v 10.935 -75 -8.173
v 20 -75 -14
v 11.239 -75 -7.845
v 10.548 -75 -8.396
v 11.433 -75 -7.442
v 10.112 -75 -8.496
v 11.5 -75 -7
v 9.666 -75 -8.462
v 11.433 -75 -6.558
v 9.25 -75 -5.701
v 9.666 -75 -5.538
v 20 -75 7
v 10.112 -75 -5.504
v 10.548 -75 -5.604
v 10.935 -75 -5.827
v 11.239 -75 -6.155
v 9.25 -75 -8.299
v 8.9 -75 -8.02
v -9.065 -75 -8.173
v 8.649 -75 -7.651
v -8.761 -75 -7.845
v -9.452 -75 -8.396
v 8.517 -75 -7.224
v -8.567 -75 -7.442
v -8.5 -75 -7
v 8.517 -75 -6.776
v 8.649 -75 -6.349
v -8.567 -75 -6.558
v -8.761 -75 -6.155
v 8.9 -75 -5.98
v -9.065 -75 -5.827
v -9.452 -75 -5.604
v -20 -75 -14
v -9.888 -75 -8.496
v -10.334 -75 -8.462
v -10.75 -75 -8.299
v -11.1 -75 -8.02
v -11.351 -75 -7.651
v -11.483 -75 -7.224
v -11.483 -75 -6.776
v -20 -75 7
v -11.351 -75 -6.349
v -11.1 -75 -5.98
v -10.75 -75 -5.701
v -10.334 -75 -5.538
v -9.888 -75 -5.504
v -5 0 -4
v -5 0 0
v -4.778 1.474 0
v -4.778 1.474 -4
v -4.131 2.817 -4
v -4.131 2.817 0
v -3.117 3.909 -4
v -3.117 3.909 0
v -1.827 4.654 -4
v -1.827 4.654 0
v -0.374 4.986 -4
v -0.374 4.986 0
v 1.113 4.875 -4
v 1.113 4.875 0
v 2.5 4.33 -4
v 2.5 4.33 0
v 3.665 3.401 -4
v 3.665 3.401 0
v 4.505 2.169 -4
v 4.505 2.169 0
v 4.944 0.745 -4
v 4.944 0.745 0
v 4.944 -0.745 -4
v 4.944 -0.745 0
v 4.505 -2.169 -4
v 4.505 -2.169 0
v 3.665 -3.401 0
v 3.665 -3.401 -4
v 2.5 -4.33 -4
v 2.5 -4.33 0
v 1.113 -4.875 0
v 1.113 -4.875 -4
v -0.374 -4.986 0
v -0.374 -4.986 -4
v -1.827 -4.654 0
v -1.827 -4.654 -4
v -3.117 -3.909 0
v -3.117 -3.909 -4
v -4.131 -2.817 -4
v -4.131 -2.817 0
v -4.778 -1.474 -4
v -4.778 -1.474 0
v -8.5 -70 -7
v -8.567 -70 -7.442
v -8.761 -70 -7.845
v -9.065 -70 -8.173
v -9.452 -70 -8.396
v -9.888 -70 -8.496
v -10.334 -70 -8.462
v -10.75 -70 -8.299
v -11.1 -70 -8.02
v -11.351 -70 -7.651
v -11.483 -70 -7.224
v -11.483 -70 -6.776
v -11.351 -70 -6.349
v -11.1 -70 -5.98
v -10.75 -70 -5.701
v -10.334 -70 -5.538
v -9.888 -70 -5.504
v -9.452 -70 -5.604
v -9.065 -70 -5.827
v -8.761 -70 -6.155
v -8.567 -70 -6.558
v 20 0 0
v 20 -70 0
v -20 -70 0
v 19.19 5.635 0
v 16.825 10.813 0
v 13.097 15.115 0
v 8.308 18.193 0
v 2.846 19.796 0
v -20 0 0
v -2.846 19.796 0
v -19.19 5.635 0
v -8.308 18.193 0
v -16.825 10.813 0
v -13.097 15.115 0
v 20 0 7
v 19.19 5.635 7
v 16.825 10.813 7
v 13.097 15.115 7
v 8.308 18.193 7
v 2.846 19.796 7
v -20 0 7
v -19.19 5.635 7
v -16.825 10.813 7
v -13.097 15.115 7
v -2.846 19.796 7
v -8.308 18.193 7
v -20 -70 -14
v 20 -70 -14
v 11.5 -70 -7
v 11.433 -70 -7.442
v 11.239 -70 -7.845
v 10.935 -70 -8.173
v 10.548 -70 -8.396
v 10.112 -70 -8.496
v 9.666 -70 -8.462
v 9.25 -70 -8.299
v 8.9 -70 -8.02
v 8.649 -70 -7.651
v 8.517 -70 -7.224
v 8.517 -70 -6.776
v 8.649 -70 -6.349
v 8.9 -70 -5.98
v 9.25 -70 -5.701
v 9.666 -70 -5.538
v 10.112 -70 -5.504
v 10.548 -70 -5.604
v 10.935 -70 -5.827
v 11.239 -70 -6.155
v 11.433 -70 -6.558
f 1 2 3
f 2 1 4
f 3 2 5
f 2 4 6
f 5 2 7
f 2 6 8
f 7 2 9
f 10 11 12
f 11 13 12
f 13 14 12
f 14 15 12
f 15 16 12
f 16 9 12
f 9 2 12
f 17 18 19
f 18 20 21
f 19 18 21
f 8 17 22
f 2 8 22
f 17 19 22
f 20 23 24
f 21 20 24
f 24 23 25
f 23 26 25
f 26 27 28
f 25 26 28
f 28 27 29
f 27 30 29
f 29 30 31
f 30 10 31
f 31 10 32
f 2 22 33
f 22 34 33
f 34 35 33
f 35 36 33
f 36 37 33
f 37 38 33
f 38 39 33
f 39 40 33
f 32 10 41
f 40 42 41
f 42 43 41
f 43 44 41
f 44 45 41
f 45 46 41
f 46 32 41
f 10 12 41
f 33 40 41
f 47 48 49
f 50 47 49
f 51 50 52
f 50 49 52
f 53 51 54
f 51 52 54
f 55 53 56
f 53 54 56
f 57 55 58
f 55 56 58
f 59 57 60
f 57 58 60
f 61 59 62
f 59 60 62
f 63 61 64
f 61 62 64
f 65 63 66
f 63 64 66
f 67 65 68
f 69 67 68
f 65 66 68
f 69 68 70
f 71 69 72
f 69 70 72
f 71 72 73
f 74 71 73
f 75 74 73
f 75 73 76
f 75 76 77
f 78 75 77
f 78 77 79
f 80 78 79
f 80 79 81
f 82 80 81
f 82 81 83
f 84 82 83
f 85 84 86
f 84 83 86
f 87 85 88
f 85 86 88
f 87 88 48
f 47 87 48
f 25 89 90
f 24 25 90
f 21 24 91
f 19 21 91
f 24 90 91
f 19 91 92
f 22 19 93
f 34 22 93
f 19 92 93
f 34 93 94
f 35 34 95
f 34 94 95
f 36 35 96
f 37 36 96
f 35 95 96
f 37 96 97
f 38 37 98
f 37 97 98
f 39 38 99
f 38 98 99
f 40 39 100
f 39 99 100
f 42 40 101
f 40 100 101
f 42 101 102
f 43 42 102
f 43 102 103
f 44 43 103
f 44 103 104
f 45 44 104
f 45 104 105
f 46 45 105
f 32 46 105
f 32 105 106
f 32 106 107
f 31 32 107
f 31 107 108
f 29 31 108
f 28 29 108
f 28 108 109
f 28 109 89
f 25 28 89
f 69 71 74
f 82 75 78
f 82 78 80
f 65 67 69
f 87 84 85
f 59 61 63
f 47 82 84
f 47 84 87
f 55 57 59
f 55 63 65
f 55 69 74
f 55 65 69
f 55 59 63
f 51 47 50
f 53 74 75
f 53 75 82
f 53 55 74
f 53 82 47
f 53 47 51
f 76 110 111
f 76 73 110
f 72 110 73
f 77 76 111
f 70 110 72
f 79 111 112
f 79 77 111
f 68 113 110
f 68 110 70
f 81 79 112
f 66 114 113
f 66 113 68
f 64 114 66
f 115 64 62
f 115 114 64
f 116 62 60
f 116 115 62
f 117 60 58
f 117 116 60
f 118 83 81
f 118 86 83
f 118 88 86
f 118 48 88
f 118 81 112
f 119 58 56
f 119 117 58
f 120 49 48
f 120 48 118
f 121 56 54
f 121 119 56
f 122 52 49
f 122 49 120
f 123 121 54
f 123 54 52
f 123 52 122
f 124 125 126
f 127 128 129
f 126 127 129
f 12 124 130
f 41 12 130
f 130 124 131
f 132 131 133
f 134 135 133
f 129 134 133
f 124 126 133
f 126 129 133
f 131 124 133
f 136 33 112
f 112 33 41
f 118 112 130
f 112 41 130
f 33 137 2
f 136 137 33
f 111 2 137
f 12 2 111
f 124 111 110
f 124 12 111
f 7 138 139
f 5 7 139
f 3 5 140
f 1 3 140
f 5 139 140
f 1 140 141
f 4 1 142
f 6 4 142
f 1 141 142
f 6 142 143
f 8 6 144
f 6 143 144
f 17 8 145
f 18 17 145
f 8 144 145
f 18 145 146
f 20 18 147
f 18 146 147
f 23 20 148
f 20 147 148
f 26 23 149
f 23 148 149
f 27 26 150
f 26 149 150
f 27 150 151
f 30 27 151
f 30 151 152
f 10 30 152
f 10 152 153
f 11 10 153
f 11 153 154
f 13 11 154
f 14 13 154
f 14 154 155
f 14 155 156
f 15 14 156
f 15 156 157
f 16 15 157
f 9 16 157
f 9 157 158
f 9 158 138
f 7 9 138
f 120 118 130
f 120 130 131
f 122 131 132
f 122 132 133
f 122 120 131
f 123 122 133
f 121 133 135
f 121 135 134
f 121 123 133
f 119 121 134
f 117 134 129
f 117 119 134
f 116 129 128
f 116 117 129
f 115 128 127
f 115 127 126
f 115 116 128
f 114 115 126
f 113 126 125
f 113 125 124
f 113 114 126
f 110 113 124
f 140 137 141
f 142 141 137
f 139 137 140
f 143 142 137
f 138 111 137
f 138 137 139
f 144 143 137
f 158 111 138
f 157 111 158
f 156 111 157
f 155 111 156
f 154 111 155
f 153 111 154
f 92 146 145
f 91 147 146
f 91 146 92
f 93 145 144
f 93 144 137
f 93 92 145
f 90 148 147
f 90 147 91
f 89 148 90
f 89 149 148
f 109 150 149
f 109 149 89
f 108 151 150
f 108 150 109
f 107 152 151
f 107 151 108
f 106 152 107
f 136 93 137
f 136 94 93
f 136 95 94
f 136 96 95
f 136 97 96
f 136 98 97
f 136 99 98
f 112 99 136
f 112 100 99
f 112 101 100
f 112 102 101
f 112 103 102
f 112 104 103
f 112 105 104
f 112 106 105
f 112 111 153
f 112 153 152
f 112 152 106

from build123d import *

# Parameters (mm, degrees)
BOSS_EXTRUDE1_DEPTH = 7
SKETCH2_R           = 5
BOSS_EXTRUDE2_DEPTH = 4
SKETCH3_W           = 40
SKETCH3_H           = 5
BOSS_EXTRUDE3_DEPTH = 14
SKETCH5_R           = 1.5
CUT_EXTRUDE1_DEPTH  = 6


with BuildPart() as part:
    # Sketch1 → Boss-Extrude1 (new body)
    with BuildSketch(Plane.XY):
        with BuildLine():
            Line((20, 0), (20, -75))
            Line((20, -75), (-20, -75))
            Line((-20, -75), (-20, 0))
            ThreePointArc((-20, 0), (0, 20), (20, 0))
        make_face()
    extrude(amount=BOSS_EXTRUDE1_DEPTH)

    # Sketch2 → Boss-Extrude2 (add)
    with BuildSketch(Plane(origin=(0, 0, 0), x_dir=(-1, 0, 0), z_dir=(0, 0, -1))):
        Circle(SKETCH2_R)
    extrude(amount=BOSS_EXTRUDE2_DEPTH)

    # Sketch3 → Boss-Extrude3 (add)
    with BuildSketch(Plane(origin=(0, 0, 0), x_dir=(-1, 0, 0), z_dir=(0, 0, -1))):
        with Locations((0, -72.5)):
            Rectangle(SKETCH3_W, SKETCH3_H)
    extrude(amount=BOSS_EXTRUDE3_DEPTH)

    # Sketch5 → Cut-Extrude1 (cut, through all)
    with BuildSketch(Plane(origin=(0, -70, 0), x_dir=(1, 0, 0), z_dir=(0, 1, 0))):
        with Locations((10, 7)):
            Circle(SKETCH5_R)
        with Locations((-10, 7)):
            Circle(SKETCH5_R)
    extrude(amount=-CUT_EXTRUDE1_DEPTH, mode=Mode.SUBTRACT)


solid = part.part
